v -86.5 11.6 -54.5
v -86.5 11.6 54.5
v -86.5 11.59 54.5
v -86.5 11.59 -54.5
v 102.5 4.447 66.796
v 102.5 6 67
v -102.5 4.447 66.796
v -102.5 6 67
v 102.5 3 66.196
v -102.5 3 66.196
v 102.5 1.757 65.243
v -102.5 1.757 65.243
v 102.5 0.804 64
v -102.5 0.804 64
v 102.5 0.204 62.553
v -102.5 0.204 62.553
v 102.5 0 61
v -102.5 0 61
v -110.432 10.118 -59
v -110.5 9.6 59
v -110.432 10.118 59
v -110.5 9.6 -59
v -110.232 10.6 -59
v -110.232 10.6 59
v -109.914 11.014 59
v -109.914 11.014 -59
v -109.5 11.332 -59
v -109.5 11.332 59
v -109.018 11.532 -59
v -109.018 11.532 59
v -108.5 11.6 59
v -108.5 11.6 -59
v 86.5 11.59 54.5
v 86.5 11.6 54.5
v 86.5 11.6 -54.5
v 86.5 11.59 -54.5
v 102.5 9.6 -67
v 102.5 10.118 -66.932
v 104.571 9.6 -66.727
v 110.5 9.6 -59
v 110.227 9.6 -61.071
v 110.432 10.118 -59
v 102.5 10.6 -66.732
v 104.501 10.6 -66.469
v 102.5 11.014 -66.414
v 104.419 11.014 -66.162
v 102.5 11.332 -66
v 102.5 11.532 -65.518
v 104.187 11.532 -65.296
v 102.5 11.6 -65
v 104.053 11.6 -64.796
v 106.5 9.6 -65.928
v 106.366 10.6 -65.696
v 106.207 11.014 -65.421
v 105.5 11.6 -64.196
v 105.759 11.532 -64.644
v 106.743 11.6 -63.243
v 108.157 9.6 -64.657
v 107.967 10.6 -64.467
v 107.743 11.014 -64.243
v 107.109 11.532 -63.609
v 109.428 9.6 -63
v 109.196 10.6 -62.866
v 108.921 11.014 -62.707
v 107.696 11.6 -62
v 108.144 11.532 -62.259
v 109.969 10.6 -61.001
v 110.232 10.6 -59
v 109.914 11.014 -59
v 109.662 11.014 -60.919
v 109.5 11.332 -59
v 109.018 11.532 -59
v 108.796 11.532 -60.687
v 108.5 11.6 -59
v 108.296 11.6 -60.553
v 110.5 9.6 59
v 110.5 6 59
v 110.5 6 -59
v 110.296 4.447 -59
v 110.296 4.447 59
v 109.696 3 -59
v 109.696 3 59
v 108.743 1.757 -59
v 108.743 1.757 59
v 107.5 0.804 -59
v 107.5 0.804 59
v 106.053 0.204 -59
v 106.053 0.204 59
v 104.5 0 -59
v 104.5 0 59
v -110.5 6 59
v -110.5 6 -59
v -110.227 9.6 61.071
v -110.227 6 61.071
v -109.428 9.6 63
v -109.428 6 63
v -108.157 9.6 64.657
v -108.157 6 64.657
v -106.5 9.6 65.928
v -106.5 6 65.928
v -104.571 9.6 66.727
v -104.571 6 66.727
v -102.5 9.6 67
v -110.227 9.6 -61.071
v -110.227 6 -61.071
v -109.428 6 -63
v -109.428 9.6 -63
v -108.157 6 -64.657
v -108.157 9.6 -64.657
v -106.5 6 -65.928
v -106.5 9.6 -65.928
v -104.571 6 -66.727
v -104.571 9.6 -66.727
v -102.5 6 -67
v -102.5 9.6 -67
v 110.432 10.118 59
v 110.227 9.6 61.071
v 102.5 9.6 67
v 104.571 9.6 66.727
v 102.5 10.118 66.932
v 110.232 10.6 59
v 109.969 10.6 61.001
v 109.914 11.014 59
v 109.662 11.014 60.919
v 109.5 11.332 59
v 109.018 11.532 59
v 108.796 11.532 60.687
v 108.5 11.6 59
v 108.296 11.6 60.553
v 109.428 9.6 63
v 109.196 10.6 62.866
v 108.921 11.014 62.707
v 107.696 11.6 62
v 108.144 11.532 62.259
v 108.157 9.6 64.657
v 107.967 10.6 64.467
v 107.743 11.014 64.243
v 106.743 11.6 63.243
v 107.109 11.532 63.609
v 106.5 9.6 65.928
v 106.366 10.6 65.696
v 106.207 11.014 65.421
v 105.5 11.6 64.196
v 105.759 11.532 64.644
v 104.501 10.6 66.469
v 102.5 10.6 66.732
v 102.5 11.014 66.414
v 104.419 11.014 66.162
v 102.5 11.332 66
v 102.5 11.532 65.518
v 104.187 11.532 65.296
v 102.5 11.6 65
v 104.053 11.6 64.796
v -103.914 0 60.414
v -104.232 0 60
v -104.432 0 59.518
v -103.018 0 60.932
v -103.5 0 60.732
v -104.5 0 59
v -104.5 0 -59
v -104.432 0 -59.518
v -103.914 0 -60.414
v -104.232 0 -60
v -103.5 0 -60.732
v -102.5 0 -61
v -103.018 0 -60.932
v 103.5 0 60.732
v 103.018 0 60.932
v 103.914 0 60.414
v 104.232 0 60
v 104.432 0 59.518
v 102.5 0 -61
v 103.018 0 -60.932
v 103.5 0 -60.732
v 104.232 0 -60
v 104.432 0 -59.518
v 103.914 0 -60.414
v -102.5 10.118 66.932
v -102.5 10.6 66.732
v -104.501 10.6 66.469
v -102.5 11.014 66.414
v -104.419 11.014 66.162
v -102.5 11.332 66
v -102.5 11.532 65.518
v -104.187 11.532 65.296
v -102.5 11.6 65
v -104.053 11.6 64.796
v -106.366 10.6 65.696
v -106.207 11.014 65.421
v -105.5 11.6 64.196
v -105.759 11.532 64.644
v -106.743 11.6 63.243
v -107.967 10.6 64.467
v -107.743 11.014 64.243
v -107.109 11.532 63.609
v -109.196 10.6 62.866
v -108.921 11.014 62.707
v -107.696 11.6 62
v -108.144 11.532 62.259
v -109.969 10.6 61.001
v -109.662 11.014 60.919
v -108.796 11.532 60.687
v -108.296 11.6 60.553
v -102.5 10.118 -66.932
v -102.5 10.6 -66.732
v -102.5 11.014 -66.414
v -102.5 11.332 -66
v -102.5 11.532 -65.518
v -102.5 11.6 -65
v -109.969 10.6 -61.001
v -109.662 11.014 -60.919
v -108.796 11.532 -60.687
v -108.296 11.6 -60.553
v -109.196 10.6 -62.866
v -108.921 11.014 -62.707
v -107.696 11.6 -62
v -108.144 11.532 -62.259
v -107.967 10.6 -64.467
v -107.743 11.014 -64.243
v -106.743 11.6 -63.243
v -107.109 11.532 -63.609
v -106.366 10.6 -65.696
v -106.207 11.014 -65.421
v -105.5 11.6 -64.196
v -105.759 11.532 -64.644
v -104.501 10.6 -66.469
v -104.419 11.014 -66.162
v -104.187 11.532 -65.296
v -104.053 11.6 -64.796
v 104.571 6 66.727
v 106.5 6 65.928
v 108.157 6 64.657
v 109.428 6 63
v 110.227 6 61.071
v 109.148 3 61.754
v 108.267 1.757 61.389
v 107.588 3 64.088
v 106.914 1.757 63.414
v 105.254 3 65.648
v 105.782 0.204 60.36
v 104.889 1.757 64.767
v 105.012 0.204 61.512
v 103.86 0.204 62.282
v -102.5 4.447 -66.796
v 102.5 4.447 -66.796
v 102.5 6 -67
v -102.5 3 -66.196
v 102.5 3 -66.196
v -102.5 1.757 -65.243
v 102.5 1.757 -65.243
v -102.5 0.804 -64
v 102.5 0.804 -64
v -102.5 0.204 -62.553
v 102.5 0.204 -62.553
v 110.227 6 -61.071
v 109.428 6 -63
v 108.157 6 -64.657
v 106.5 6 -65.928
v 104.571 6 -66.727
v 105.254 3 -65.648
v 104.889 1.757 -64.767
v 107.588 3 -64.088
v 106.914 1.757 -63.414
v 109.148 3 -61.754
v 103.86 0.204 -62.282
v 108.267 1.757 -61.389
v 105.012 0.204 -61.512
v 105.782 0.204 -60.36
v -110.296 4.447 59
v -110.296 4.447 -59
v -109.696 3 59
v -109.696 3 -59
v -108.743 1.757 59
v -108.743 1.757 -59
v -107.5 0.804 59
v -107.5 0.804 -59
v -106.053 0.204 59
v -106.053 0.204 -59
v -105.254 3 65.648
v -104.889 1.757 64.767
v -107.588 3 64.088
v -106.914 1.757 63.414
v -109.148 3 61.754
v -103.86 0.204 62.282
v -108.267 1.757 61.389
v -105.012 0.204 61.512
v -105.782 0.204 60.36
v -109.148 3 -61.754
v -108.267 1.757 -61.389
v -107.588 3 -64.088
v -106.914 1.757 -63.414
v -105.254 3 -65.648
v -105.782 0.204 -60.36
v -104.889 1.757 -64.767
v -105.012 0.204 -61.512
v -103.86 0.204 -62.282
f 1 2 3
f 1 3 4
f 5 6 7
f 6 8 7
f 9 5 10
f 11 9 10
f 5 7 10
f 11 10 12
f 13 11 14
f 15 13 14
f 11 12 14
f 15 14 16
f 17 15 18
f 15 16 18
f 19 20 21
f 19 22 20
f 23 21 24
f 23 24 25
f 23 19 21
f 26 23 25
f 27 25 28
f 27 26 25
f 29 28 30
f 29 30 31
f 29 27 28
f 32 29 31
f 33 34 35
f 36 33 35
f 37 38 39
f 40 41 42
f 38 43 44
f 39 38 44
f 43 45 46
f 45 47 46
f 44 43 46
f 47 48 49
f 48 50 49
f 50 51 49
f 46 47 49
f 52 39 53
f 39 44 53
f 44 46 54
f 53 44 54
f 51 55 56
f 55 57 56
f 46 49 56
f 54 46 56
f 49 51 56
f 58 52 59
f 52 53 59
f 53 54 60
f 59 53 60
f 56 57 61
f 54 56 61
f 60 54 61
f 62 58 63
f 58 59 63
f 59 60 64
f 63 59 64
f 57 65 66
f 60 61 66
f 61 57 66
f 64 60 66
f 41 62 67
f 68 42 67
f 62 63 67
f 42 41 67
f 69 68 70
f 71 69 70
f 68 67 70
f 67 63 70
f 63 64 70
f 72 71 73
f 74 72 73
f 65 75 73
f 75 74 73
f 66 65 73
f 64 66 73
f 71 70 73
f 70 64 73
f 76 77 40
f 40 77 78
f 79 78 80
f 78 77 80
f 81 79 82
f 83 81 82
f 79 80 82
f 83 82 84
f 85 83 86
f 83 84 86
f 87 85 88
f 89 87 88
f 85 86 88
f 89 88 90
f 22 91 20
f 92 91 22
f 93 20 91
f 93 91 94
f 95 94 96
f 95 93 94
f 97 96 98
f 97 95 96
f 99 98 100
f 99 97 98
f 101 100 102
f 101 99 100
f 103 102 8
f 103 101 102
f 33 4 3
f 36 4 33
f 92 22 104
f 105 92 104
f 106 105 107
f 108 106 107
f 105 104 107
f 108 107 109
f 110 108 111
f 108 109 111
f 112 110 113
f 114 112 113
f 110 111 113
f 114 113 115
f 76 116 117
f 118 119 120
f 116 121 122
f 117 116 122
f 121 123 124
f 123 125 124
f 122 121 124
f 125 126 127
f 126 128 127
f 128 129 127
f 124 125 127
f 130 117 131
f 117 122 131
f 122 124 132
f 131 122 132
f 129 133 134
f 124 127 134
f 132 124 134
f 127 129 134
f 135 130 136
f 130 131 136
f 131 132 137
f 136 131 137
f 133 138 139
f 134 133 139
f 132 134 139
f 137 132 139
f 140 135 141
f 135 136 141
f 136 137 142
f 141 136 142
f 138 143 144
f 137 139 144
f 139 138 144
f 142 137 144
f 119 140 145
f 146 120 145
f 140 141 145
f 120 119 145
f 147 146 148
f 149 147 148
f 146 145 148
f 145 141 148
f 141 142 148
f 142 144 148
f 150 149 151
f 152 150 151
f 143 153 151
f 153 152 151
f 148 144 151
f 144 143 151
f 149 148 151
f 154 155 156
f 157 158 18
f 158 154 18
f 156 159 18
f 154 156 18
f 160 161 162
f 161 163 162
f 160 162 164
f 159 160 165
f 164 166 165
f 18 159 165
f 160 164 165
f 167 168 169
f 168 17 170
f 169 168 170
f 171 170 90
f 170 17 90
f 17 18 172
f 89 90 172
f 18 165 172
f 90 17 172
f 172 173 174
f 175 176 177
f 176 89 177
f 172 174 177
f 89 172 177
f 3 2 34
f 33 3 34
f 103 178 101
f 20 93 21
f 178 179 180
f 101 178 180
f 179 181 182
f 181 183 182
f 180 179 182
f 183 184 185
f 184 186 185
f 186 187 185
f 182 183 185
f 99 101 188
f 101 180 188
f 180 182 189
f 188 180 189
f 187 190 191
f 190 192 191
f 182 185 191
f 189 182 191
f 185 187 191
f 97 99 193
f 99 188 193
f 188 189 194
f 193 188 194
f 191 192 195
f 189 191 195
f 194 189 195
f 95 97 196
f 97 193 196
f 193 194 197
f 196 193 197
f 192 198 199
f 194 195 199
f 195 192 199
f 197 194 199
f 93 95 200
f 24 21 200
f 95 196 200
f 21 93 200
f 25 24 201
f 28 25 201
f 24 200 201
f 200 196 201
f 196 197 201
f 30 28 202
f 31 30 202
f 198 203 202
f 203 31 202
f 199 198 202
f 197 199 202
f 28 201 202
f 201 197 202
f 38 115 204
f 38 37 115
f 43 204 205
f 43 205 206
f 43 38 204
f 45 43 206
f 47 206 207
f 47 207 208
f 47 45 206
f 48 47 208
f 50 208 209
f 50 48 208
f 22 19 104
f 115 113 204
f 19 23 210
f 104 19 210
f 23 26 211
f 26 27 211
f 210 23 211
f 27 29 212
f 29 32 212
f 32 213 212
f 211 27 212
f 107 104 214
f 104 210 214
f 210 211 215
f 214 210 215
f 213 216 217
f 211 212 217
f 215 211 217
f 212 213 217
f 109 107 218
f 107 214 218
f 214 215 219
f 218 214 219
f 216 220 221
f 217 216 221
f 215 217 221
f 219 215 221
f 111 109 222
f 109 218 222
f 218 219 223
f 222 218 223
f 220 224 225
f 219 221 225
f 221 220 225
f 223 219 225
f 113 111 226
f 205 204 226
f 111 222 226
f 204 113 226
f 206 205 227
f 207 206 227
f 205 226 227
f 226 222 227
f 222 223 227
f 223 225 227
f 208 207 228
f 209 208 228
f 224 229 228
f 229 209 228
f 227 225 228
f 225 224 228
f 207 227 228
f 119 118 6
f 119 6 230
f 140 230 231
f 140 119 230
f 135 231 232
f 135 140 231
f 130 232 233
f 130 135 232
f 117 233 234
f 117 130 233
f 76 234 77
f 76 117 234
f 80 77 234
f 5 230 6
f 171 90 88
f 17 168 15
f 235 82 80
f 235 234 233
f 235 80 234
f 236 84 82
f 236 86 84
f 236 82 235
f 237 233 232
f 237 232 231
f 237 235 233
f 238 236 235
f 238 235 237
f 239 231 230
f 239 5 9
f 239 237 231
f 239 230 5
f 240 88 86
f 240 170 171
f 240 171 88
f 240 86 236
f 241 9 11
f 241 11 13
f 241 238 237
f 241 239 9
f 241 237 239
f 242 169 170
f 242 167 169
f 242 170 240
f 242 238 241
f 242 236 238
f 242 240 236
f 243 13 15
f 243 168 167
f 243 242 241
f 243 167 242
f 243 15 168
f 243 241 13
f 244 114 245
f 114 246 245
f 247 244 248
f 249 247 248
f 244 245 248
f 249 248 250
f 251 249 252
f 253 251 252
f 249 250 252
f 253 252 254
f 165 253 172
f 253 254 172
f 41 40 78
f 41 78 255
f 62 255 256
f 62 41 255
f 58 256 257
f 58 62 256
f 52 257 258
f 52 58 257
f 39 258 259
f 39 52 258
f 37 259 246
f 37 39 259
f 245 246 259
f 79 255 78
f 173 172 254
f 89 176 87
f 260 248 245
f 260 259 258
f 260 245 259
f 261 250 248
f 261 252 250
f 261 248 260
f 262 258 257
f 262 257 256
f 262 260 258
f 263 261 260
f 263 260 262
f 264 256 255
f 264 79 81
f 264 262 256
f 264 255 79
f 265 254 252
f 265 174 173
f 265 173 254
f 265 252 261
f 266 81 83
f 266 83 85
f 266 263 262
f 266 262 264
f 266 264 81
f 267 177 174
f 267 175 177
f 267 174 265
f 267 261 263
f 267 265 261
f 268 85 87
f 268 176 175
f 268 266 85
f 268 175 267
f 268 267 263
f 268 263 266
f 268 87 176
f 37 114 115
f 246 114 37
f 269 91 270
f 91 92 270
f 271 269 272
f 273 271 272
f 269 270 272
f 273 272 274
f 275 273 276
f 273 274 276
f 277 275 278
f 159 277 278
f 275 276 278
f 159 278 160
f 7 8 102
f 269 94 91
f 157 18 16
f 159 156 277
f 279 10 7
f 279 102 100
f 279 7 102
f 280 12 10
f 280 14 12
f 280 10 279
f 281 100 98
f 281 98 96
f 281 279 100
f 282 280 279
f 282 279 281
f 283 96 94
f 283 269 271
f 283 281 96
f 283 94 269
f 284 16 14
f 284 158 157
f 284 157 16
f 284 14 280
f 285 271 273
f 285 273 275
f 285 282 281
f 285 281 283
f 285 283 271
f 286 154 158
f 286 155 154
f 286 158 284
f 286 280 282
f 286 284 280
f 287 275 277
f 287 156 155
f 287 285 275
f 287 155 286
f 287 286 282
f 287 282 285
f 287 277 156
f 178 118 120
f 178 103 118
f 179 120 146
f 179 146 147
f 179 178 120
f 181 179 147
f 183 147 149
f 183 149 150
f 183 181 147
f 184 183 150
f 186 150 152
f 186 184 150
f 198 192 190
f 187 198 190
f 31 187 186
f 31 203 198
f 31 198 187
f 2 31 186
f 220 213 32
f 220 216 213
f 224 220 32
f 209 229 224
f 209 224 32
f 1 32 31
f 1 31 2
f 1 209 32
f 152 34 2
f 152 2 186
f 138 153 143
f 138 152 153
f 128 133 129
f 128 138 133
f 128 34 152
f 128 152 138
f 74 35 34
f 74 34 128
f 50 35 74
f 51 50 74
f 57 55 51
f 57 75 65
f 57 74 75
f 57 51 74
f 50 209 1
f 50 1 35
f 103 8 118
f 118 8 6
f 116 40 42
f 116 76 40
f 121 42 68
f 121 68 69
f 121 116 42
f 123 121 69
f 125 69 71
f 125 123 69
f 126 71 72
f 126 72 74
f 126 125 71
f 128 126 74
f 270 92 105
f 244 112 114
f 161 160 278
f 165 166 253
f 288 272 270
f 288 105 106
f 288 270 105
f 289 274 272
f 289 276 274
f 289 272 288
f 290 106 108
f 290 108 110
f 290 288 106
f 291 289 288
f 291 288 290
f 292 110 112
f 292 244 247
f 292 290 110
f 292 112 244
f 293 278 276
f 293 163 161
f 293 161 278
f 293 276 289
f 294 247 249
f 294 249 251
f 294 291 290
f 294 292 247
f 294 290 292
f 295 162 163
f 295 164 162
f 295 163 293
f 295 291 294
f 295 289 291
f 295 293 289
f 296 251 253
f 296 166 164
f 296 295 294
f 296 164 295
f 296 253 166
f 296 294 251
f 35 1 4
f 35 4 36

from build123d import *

# Parameters (mm, degrees)
SKETCH1_W           = 221
SKETCH1_H           = 134
BOSS_EXTRUDE1_DEPTH = 11.6
FILLET1_R           = 8
FILLET2_R           = 2
FILLET3_R           = 6
SKETCH2_W           = 173
SKETCH2_H           = 109
CUT_EXTRUDE1_DEPTH  = 0.01


with BuildPart() as part:
    # Sketch1 → Boss-Extrude1 (new body)
    with BuildSketch(Plane(origin=(0, 0, 0), x_dir=(1, 0, 0), z_dir=(0, 1, 0))):
        Rectangle(SKETCH1_W, SKETCH1_H)
    extrude(amount=BOSS_EXTRUDE1_DEPTH)

    # Fillet1
    fillet1_edges = [part.edges().sort_by_distance(p)[0] for p in [
        (-110.5, 5.8, -67),
        (110.5, 5.8, -67),
        (110.5, 5.8, 67),
        (-110.5, 5.8, 67),
    ]]
    fillet(fillet1_edges, radius=FILLET1_R)

    # Fillet2
    fillet2_edges = [part.edges().sort_by_distance(p)[0] for p in [
        (-110.5, 11.6, 0),
        (0, 11.6, -67),
        (0, 11.6, 67),
        (110.5, 11.6, 0),
        (-108.156854249, 11.6, 64.656854249),
        (108.156854249, 11.6, 64.656854249),
        (108.156854249, 11.6, -64.656854249),
        (-108.156854249, 11.6, -64.656854249),
    ]]
    fillet(fillet2_edges, radius=FILLET2_R)

    # Fillet3
    fillet3_edges = [part.edges().sort_by_distance(p)[0] for p in [
        (-110.5, 0, 0),
        (0, 0, -67),
        (110.5, 0, 0),
        (0, 0, 67),
        (-108.156854249, 0, 64.656854249),
        (108.156854249, 0, 64.656854249),
        (108.156854249, 0, -64.656854249),
        (-108.156854249, 0, -64.656854249),
    ]]
    fillet(fillet3_edges, radius=FILLET3_R)

    # Sketch2 → Cut-Extrude1 (cut)
    with BuildSketch(Plane(origin=(0, 11.6, 0), x_dir=(1, 0, 0), z_dir=(0, 1, 0))):
        Rectangle(SKETCH2_W, SKETCH2_H)
    extrude(amount=-CUT_EXTRUDE1_DEPTH, mode=Mode.SUBTRACT)


solid = part.part
